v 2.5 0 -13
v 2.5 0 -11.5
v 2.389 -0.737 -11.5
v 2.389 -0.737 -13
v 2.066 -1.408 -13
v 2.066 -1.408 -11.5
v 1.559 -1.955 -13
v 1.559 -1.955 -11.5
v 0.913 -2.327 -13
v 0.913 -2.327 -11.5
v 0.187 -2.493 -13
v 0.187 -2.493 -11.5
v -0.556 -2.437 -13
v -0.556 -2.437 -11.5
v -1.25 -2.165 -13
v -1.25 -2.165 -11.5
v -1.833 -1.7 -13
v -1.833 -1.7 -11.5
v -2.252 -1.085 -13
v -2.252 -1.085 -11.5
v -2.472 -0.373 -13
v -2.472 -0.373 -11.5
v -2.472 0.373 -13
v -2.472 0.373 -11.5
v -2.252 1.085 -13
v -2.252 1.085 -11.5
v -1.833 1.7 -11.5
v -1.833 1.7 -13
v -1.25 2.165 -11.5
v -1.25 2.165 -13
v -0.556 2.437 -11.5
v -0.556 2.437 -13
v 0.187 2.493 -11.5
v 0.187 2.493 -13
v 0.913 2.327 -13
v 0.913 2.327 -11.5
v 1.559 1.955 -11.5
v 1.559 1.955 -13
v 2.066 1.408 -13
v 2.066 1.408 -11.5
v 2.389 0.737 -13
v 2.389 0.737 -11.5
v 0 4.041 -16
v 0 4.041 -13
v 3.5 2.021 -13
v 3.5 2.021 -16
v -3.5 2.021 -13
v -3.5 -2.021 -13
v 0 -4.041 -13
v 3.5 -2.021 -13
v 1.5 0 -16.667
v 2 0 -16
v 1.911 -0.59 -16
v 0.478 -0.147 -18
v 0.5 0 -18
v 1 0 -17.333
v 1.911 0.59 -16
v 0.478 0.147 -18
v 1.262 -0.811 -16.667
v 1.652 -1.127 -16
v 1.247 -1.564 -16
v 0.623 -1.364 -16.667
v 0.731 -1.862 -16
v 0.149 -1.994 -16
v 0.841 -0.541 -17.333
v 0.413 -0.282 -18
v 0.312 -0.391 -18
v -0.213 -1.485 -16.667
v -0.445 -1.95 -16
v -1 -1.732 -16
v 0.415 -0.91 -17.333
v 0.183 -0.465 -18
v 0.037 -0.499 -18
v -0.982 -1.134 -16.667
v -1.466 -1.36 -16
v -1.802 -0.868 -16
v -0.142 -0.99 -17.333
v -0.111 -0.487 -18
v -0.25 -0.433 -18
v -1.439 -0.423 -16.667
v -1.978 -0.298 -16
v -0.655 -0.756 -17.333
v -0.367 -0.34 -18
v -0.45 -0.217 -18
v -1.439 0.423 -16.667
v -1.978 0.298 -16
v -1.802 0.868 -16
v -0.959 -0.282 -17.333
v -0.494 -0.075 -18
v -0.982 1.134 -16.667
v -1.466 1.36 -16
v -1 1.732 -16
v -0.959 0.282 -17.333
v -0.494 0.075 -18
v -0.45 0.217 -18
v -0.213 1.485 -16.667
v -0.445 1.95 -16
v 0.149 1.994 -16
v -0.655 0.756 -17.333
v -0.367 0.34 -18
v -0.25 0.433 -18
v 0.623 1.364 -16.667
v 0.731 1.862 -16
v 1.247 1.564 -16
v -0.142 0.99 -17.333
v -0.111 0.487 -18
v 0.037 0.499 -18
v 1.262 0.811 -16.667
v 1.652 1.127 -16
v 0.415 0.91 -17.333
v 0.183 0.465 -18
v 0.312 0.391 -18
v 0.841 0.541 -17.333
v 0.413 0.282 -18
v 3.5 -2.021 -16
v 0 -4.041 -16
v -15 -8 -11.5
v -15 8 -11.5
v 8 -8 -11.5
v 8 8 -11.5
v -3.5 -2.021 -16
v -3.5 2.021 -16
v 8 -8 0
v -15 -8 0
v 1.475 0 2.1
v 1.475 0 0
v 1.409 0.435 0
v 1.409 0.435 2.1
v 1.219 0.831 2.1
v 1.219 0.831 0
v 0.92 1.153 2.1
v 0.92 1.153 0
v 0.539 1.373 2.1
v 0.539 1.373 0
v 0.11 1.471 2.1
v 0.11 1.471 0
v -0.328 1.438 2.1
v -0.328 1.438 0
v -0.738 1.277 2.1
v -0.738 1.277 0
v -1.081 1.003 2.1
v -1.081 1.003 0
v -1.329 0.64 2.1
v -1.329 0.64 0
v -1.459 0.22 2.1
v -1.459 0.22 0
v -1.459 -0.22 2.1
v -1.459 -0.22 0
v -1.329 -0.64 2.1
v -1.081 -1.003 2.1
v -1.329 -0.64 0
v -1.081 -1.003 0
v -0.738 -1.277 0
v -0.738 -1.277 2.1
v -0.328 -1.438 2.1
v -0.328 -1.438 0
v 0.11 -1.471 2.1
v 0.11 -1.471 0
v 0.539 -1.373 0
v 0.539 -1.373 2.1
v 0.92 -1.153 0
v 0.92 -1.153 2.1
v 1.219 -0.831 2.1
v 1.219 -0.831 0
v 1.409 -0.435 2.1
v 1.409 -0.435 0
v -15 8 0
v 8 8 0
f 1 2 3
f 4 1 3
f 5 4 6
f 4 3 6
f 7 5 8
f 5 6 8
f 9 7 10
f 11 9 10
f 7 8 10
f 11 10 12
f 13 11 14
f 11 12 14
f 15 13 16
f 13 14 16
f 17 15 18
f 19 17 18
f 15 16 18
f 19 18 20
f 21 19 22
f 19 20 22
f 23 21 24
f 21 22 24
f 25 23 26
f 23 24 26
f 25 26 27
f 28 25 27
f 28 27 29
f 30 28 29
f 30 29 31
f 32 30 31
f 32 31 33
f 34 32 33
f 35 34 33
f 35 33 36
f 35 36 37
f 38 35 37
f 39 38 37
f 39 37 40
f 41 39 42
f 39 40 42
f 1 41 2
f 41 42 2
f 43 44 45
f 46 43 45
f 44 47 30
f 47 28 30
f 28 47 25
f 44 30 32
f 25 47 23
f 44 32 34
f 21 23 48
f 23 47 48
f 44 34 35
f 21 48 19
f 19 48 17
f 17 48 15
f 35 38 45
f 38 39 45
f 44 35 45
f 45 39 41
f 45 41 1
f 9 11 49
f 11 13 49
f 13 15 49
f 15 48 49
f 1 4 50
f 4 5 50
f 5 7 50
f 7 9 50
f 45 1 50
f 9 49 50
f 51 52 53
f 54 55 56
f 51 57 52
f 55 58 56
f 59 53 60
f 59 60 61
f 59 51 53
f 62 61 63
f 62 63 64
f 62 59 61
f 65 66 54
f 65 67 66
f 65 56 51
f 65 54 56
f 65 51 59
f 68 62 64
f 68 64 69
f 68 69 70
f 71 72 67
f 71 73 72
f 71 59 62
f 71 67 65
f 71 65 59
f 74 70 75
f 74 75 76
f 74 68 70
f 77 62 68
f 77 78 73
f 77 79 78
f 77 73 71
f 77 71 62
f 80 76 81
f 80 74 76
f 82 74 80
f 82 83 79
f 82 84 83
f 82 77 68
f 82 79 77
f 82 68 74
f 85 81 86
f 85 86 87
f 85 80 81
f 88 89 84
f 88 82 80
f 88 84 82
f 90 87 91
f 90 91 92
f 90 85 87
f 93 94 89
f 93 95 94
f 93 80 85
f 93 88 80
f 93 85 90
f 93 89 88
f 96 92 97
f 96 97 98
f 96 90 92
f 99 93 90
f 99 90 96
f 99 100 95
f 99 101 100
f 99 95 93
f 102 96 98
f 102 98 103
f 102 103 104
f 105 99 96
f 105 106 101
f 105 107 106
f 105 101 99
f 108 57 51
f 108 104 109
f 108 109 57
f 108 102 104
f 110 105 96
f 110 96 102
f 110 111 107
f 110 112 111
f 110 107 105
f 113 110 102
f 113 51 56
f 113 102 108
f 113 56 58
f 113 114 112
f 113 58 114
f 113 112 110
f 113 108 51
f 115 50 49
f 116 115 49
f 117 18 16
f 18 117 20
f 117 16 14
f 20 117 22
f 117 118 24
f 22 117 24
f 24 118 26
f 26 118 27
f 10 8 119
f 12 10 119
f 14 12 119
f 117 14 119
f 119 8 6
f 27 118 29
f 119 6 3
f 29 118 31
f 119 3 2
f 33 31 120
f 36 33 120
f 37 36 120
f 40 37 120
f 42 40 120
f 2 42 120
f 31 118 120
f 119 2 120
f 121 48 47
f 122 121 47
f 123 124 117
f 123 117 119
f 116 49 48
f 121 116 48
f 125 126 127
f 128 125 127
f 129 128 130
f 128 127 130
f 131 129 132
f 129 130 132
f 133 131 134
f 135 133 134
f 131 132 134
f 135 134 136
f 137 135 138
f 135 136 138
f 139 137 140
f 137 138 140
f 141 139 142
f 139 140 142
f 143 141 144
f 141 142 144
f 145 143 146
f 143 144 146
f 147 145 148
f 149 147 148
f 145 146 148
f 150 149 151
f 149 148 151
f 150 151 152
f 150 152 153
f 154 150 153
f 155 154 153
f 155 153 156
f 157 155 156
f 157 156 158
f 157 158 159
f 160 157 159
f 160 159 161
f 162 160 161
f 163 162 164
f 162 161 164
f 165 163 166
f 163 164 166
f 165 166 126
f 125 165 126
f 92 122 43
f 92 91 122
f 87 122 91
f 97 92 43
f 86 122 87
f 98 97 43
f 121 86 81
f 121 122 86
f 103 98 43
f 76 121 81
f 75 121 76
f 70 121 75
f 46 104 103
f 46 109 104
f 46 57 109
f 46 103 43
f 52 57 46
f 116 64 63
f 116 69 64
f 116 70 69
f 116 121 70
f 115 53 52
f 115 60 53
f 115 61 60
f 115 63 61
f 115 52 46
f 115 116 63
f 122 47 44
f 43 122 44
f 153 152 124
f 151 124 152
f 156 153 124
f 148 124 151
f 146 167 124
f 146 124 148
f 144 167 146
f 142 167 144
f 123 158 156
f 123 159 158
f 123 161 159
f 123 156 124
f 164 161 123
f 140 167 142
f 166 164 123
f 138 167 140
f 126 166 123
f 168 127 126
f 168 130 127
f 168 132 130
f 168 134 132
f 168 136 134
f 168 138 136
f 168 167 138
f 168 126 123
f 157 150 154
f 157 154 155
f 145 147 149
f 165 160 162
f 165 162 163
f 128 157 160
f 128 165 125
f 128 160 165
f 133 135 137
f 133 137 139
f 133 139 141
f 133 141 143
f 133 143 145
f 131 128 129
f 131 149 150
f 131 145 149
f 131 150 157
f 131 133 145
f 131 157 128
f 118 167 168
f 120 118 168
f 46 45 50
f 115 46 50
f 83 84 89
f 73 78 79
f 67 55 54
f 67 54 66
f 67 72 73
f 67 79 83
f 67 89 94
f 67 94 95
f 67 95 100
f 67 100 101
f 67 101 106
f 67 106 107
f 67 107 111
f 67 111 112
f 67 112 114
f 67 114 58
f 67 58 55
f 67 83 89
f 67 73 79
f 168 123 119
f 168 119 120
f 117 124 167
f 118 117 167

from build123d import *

# Parameters (mm, degrees)
F0_R     = 1.475
F1_DEPTH = 2.1
F0_W     = 23
F0_H     = 16
F2_DEPTH = 11.5
F3_R     = 2.5
F4_DEPTH = 1.5
F6_DEPTH = 3
F7_R     = 2
F9_R     = 0.5


with BuildPart() as f1:
    # F0 (on Top) → F1 (new body)
    with BuildSketch(Plane.XY):
        Circle(F0_R)
    extrude(amount=F1_DEPTH)

    # F0 (on Top) → F2 (join)
    with BuildSketch(Plane.XY):
        with Locations((-3.5, 0)):
            Rectangle(F0_W, F0_H)
        Circle(F0_R, mode=Mode.SUBTRACT)
        Circle(F0_R)
    extrude(amount=-F2_DEPTH)

    # F3 (on face) → F4 (join)
    with BuildSketch(Plane(origin=(0, 0, -11.5), x_dir=(1, 0, 0), z_dir=(0, 0, -1))):
        Circle(F3_R)
    extrude(amount=F4_DEPTH)

    # F5 (on face) → F6 (join)
    with BuildSketch(Plane(origin=(0, 0, -13), x_dir=(1, 0, 0), z_dir=(0, 0, -1))):
        Polygon((3.5, -2.0207259422), (3.5, 2.0207259422), (0, 4.0414518843), (-3.5, 2.0207259422), (-3.5, -2.0207259422), (0, -4.0414518843), align=None)
    extrude(amount=F6_DEPTH)

    # F7 (on face) → F10 section 0
    with BuildSketch(Plane(origin=(0, 0, -16), x_dir=(1, 0, 0), z_dir=(0, 0, -1))):
        Circle(F7_R)
    # F9 (on offset) → F10 section 1
    with BuildSketch(Plane(origin=(0, 0, -18), x_dir=(1, 0, 0), z_dir=(0, 0, -1))):
        Circle(F9_R)
    loft()


solid = f1.part
